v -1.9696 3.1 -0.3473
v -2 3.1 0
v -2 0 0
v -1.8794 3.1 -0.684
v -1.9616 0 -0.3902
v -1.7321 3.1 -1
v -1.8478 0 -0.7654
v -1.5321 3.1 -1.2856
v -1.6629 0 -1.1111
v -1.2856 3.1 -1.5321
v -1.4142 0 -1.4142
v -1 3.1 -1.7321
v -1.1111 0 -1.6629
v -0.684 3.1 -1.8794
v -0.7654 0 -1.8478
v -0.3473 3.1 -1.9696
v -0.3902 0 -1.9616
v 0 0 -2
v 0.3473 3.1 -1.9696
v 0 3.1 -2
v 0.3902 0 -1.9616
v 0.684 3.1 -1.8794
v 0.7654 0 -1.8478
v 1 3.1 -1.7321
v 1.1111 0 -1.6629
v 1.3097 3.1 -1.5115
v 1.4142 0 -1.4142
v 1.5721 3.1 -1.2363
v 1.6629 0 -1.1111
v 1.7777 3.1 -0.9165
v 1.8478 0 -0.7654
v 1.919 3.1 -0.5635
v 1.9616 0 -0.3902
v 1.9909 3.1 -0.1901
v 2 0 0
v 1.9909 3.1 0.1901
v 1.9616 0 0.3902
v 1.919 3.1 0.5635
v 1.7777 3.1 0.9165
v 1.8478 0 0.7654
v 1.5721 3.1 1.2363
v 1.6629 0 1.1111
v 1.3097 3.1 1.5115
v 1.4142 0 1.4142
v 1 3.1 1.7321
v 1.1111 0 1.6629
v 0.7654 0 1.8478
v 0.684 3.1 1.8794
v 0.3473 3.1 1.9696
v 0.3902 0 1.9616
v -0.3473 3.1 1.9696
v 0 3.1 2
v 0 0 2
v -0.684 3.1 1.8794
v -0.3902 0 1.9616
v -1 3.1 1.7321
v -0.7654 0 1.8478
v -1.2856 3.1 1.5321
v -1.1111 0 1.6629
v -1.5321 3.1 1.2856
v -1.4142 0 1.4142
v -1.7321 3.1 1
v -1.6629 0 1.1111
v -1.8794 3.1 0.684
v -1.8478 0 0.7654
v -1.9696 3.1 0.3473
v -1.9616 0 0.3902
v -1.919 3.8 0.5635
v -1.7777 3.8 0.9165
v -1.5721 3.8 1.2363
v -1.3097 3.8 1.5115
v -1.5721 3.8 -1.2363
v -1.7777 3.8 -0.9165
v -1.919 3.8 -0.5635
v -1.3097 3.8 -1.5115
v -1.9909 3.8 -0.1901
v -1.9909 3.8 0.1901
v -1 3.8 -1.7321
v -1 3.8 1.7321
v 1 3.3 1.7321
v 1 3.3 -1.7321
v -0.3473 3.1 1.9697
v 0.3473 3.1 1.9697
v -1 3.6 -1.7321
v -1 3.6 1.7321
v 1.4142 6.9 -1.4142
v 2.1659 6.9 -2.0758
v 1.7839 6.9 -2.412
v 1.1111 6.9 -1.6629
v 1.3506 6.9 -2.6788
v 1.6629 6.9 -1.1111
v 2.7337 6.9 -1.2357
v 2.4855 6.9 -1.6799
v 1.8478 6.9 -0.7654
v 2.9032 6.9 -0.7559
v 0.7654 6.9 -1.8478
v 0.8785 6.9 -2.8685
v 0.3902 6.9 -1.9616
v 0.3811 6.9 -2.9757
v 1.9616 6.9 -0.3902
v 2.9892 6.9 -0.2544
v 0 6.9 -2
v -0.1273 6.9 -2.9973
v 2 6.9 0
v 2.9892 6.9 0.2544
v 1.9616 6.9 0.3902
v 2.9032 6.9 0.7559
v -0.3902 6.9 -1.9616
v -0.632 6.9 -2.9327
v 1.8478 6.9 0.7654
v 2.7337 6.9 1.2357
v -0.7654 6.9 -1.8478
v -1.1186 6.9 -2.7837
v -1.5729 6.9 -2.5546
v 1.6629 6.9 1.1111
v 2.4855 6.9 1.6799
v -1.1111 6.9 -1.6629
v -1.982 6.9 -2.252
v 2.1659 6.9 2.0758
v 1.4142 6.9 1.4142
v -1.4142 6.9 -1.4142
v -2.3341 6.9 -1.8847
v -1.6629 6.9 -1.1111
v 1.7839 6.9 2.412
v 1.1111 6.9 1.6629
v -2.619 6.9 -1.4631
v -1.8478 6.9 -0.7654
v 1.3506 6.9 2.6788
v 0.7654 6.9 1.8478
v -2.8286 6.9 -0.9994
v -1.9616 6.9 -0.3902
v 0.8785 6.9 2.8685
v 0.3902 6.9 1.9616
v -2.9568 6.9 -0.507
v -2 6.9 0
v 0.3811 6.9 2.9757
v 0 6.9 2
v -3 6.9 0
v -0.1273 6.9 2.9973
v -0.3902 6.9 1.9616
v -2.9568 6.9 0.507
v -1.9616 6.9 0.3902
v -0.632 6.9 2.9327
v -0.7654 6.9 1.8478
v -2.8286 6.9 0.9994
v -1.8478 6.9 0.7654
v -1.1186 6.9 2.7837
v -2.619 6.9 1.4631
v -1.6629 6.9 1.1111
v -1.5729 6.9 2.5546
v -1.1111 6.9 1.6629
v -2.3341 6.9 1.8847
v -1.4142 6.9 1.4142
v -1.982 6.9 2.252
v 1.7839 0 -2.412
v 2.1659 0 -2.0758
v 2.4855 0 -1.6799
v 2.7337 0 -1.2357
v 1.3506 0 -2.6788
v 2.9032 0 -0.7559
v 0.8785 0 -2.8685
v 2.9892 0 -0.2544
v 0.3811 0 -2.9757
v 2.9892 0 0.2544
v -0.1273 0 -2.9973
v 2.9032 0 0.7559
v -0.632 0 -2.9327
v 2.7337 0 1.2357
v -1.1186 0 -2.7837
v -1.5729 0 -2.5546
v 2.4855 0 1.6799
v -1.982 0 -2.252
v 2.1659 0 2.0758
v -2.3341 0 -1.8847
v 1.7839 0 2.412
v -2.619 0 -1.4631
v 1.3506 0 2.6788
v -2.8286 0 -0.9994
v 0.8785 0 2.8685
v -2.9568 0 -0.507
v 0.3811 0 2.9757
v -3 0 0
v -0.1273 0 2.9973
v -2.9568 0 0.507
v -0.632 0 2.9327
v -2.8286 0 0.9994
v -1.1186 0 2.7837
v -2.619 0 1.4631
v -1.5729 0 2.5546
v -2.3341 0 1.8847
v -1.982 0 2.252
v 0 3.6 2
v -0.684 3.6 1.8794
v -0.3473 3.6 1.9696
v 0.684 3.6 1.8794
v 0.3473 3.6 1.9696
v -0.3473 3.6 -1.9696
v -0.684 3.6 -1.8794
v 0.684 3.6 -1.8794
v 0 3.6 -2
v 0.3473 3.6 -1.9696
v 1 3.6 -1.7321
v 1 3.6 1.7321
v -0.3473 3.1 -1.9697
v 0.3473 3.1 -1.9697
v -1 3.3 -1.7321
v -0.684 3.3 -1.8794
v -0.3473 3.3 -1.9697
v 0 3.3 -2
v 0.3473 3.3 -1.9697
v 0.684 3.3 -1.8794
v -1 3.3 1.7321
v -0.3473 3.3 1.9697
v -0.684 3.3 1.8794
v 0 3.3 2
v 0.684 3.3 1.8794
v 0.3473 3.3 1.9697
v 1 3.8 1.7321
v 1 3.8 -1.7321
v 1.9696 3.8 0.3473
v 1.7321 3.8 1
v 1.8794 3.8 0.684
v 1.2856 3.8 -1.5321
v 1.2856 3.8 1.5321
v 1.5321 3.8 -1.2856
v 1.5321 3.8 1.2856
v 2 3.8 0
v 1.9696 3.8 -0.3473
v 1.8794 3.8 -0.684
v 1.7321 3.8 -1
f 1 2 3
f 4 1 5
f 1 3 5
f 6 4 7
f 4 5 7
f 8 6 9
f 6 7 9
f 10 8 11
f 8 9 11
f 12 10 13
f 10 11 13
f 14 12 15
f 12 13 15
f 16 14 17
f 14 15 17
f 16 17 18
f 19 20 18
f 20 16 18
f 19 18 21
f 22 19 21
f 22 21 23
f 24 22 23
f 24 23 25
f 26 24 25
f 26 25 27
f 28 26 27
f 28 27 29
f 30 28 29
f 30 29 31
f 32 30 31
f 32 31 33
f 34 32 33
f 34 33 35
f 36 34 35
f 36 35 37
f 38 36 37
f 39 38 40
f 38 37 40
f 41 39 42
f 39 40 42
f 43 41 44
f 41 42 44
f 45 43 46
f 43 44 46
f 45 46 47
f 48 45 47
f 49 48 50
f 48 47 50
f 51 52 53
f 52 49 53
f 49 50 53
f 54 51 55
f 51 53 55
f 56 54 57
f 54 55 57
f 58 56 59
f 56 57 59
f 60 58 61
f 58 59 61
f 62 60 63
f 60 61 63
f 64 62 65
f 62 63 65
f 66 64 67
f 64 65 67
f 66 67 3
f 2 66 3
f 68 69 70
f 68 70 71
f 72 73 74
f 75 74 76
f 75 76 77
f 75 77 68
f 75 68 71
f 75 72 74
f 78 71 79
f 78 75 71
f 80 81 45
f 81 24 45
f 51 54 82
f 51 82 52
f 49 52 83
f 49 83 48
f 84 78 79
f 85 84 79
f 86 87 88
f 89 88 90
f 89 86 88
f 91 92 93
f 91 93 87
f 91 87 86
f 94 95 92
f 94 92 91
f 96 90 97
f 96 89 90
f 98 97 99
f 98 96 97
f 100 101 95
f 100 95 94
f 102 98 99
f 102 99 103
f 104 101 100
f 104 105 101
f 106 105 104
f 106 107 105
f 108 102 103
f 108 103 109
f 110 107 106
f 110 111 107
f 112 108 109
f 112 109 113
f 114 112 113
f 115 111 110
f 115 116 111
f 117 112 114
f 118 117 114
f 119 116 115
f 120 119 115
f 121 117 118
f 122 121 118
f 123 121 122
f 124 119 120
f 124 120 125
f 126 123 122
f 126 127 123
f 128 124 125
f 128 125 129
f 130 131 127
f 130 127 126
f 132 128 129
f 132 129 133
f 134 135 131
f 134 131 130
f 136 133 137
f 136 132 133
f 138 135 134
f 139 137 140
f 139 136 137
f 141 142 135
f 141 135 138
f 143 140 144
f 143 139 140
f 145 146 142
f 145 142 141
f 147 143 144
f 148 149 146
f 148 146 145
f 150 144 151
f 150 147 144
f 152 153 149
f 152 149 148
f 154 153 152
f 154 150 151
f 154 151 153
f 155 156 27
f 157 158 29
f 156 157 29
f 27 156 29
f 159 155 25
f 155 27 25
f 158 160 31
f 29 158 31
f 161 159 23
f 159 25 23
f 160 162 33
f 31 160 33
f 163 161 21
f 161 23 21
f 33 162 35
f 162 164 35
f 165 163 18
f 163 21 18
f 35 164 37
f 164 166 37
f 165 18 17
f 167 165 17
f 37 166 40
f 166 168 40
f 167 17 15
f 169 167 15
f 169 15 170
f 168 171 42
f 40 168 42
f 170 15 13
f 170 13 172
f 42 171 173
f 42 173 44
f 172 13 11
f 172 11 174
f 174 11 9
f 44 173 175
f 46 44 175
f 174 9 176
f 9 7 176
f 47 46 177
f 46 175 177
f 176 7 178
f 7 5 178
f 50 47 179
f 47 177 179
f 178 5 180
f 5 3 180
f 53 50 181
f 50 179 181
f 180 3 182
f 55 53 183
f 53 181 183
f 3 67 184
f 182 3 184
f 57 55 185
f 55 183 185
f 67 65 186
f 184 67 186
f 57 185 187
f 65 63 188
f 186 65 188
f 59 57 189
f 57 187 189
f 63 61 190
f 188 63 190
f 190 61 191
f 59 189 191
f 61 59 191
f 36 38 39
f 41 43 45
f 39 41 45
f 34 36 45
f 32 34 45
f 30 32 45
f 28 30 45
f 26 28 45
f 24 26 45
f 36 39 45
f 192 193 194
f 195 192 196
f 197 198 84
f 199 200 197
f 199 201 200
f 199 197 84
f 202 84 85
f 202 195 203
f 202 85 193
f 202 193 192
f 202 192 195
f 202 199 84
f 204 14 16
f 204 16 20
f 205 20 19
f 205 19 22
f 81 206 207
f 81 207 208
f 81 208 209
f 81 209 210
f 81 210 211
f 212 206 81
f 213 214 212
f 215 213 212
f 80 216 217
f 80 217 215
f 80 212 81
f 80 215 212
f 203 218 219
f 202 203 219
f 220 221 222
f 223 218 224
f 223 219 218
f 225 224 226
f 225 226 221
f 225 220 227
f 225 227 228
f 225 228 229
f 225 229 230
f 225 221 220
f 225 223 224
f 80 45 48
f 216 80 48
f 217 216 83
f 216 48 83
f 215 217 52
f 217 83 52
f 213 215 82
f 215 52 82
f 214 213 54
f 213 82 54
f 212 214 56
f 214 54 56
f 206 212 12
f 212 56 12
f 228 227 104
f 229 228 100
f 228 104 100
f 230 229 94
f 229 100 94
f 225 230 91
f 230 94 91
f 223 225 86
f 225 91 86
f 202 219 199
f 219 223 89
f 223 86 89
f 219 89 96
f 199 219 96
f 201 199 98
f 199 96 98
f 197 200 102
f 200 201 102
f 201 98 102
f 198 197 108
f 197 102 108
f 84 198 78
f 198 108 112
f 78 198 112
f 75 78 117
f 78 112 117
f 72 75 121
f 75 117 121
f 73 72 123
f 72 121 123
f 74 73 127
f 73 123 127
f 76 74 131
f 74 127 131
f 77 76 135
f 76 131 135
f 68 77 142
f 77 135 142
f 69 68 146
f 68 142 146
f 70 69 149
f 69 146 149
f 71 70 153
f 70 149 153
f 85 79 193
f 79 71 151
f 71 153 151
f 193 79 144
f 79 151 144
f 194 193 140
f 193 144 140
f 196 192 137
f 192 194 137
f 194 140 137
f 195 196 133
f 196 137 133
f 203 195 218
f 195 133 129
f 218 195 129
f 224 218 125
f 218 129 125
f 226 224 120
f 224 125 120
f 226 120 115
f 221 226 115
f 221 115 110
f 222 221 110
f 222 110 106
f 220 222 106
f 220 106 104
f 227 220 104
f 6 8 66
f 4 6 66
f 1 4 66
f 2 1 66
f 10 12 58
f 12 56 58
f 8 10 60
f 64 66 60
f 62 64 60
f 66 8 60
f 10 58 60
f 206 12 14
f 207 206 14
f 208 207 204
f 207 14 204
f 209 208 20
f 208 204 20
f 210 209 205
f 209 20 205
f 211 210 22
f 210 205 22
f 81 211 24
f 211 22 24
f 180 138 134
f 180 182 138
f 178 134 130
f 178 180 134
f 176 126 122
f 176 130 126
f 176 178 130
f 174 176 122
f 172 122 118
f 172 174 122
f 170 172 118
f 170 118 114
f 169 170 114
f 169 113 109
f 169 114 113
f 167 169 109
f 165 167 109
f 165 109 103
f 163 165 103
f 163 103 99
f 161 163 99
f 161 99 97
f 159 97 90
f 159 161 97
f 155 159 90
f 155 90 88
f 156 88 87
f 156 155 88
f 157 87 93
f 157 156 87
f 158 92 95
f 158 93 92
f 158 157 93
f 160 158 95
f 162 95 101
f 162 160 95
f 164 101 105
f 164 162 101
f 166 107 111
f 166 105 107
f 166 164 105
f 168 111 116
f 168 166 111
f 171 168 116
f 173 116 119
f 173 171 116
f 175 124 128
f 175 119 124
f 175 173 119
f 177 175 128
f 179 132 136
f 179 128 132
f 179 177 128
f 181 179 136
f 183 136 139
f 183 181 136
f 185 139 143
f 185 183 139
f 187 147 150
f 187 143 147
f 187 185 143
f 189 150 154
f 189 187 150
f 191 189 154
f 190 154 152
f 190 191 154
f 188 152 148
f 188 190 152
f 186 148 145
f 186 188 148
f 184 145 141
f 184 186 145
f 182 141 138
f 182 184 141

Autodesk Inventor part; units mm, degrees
ref_plane "YZ Plane" through (0, 0, 0) normal (1, 0, 0) x (0, 1, 0)
ref_plane "XZ Plane" through (0, 0, 0) normal (0, 1, 0) x (-1, 0, 0)
ref_plane "XY Plane" through (0, 0, 0) normal (0, 0, 1) x (1, 0, 0)
sketch "Sketch1" plane through (0, 0, 0) normal (0, 1, 0) x (-1, 0, 0)
  circle A0 centre (0, 0) radius 3
  circle A1 centre (0, 0) radius 2
  dimension "d0" = 6
  dimension "d3" = 4
extrude "Extrusion1" add sketch "Sketch1" along normal blind 6.9 contours A0 | A1
extrude "Extrusion2" cut sketch "Sketch1" along normal blind 3.1 contours A1
sketch "Sketch2" plane through (0, 6.9, 0) normal (0, 1, 0) x (1, 0, 0)
  circle A0 centre (0, 0) radius 2 projected
extrude "Extrusion3" cut sketch "Sketch2" against normal blind 3.1
sketch "Sketch3" plane through (0, 3.8, 0) normal (0, 1, 0) x (1, 0, 0)
  line L0 (1, 2) -> (-1, 2)
  line L1 (-1, 2) -> (-1, -2)
  line L2 (-1, -2) -> (1, -2)
  line L3 (1, -2) -> (1, 2)
  line L4 (1, 2) -> (-1, -2) construction
  line L5 (-1, 2) -> (1, -2) construction
  circle A0 centre (0, 0) radius 2 projected
  point P0 (1, -1.7321)
  point P1 (1, 1.7321)
  point P2 (-1, 1.7321)
  point P3 (-1, -1.7321)
  dimension "d8" = 2
extrude "Extrusion4" cut sketch "Sketch3" against normal blind 0.2 contours A0 L3 L1
sketch "Sketch4" plane through (0, 3.1, 0) normal (0, -1, 0) x (1, 0, 0)
  line L0 (1, -1.7321) -> (1, 1.7321) projected
  arc A0 (-1, -1.7321) -> (1, -1.7321) centre (0, 0) ccw projected
  line L1 (-1, 1.7321) -> (-1, -1.7321) projected
  arc A1 (1, 1.7321) -> (-1, 1.7321) centre (0, 0) ccw projected
extrude "Extrusion5" cut sketch "Sketch4" against normal blind 0.2
properties part number "Printed Standoff 6.9mm"
